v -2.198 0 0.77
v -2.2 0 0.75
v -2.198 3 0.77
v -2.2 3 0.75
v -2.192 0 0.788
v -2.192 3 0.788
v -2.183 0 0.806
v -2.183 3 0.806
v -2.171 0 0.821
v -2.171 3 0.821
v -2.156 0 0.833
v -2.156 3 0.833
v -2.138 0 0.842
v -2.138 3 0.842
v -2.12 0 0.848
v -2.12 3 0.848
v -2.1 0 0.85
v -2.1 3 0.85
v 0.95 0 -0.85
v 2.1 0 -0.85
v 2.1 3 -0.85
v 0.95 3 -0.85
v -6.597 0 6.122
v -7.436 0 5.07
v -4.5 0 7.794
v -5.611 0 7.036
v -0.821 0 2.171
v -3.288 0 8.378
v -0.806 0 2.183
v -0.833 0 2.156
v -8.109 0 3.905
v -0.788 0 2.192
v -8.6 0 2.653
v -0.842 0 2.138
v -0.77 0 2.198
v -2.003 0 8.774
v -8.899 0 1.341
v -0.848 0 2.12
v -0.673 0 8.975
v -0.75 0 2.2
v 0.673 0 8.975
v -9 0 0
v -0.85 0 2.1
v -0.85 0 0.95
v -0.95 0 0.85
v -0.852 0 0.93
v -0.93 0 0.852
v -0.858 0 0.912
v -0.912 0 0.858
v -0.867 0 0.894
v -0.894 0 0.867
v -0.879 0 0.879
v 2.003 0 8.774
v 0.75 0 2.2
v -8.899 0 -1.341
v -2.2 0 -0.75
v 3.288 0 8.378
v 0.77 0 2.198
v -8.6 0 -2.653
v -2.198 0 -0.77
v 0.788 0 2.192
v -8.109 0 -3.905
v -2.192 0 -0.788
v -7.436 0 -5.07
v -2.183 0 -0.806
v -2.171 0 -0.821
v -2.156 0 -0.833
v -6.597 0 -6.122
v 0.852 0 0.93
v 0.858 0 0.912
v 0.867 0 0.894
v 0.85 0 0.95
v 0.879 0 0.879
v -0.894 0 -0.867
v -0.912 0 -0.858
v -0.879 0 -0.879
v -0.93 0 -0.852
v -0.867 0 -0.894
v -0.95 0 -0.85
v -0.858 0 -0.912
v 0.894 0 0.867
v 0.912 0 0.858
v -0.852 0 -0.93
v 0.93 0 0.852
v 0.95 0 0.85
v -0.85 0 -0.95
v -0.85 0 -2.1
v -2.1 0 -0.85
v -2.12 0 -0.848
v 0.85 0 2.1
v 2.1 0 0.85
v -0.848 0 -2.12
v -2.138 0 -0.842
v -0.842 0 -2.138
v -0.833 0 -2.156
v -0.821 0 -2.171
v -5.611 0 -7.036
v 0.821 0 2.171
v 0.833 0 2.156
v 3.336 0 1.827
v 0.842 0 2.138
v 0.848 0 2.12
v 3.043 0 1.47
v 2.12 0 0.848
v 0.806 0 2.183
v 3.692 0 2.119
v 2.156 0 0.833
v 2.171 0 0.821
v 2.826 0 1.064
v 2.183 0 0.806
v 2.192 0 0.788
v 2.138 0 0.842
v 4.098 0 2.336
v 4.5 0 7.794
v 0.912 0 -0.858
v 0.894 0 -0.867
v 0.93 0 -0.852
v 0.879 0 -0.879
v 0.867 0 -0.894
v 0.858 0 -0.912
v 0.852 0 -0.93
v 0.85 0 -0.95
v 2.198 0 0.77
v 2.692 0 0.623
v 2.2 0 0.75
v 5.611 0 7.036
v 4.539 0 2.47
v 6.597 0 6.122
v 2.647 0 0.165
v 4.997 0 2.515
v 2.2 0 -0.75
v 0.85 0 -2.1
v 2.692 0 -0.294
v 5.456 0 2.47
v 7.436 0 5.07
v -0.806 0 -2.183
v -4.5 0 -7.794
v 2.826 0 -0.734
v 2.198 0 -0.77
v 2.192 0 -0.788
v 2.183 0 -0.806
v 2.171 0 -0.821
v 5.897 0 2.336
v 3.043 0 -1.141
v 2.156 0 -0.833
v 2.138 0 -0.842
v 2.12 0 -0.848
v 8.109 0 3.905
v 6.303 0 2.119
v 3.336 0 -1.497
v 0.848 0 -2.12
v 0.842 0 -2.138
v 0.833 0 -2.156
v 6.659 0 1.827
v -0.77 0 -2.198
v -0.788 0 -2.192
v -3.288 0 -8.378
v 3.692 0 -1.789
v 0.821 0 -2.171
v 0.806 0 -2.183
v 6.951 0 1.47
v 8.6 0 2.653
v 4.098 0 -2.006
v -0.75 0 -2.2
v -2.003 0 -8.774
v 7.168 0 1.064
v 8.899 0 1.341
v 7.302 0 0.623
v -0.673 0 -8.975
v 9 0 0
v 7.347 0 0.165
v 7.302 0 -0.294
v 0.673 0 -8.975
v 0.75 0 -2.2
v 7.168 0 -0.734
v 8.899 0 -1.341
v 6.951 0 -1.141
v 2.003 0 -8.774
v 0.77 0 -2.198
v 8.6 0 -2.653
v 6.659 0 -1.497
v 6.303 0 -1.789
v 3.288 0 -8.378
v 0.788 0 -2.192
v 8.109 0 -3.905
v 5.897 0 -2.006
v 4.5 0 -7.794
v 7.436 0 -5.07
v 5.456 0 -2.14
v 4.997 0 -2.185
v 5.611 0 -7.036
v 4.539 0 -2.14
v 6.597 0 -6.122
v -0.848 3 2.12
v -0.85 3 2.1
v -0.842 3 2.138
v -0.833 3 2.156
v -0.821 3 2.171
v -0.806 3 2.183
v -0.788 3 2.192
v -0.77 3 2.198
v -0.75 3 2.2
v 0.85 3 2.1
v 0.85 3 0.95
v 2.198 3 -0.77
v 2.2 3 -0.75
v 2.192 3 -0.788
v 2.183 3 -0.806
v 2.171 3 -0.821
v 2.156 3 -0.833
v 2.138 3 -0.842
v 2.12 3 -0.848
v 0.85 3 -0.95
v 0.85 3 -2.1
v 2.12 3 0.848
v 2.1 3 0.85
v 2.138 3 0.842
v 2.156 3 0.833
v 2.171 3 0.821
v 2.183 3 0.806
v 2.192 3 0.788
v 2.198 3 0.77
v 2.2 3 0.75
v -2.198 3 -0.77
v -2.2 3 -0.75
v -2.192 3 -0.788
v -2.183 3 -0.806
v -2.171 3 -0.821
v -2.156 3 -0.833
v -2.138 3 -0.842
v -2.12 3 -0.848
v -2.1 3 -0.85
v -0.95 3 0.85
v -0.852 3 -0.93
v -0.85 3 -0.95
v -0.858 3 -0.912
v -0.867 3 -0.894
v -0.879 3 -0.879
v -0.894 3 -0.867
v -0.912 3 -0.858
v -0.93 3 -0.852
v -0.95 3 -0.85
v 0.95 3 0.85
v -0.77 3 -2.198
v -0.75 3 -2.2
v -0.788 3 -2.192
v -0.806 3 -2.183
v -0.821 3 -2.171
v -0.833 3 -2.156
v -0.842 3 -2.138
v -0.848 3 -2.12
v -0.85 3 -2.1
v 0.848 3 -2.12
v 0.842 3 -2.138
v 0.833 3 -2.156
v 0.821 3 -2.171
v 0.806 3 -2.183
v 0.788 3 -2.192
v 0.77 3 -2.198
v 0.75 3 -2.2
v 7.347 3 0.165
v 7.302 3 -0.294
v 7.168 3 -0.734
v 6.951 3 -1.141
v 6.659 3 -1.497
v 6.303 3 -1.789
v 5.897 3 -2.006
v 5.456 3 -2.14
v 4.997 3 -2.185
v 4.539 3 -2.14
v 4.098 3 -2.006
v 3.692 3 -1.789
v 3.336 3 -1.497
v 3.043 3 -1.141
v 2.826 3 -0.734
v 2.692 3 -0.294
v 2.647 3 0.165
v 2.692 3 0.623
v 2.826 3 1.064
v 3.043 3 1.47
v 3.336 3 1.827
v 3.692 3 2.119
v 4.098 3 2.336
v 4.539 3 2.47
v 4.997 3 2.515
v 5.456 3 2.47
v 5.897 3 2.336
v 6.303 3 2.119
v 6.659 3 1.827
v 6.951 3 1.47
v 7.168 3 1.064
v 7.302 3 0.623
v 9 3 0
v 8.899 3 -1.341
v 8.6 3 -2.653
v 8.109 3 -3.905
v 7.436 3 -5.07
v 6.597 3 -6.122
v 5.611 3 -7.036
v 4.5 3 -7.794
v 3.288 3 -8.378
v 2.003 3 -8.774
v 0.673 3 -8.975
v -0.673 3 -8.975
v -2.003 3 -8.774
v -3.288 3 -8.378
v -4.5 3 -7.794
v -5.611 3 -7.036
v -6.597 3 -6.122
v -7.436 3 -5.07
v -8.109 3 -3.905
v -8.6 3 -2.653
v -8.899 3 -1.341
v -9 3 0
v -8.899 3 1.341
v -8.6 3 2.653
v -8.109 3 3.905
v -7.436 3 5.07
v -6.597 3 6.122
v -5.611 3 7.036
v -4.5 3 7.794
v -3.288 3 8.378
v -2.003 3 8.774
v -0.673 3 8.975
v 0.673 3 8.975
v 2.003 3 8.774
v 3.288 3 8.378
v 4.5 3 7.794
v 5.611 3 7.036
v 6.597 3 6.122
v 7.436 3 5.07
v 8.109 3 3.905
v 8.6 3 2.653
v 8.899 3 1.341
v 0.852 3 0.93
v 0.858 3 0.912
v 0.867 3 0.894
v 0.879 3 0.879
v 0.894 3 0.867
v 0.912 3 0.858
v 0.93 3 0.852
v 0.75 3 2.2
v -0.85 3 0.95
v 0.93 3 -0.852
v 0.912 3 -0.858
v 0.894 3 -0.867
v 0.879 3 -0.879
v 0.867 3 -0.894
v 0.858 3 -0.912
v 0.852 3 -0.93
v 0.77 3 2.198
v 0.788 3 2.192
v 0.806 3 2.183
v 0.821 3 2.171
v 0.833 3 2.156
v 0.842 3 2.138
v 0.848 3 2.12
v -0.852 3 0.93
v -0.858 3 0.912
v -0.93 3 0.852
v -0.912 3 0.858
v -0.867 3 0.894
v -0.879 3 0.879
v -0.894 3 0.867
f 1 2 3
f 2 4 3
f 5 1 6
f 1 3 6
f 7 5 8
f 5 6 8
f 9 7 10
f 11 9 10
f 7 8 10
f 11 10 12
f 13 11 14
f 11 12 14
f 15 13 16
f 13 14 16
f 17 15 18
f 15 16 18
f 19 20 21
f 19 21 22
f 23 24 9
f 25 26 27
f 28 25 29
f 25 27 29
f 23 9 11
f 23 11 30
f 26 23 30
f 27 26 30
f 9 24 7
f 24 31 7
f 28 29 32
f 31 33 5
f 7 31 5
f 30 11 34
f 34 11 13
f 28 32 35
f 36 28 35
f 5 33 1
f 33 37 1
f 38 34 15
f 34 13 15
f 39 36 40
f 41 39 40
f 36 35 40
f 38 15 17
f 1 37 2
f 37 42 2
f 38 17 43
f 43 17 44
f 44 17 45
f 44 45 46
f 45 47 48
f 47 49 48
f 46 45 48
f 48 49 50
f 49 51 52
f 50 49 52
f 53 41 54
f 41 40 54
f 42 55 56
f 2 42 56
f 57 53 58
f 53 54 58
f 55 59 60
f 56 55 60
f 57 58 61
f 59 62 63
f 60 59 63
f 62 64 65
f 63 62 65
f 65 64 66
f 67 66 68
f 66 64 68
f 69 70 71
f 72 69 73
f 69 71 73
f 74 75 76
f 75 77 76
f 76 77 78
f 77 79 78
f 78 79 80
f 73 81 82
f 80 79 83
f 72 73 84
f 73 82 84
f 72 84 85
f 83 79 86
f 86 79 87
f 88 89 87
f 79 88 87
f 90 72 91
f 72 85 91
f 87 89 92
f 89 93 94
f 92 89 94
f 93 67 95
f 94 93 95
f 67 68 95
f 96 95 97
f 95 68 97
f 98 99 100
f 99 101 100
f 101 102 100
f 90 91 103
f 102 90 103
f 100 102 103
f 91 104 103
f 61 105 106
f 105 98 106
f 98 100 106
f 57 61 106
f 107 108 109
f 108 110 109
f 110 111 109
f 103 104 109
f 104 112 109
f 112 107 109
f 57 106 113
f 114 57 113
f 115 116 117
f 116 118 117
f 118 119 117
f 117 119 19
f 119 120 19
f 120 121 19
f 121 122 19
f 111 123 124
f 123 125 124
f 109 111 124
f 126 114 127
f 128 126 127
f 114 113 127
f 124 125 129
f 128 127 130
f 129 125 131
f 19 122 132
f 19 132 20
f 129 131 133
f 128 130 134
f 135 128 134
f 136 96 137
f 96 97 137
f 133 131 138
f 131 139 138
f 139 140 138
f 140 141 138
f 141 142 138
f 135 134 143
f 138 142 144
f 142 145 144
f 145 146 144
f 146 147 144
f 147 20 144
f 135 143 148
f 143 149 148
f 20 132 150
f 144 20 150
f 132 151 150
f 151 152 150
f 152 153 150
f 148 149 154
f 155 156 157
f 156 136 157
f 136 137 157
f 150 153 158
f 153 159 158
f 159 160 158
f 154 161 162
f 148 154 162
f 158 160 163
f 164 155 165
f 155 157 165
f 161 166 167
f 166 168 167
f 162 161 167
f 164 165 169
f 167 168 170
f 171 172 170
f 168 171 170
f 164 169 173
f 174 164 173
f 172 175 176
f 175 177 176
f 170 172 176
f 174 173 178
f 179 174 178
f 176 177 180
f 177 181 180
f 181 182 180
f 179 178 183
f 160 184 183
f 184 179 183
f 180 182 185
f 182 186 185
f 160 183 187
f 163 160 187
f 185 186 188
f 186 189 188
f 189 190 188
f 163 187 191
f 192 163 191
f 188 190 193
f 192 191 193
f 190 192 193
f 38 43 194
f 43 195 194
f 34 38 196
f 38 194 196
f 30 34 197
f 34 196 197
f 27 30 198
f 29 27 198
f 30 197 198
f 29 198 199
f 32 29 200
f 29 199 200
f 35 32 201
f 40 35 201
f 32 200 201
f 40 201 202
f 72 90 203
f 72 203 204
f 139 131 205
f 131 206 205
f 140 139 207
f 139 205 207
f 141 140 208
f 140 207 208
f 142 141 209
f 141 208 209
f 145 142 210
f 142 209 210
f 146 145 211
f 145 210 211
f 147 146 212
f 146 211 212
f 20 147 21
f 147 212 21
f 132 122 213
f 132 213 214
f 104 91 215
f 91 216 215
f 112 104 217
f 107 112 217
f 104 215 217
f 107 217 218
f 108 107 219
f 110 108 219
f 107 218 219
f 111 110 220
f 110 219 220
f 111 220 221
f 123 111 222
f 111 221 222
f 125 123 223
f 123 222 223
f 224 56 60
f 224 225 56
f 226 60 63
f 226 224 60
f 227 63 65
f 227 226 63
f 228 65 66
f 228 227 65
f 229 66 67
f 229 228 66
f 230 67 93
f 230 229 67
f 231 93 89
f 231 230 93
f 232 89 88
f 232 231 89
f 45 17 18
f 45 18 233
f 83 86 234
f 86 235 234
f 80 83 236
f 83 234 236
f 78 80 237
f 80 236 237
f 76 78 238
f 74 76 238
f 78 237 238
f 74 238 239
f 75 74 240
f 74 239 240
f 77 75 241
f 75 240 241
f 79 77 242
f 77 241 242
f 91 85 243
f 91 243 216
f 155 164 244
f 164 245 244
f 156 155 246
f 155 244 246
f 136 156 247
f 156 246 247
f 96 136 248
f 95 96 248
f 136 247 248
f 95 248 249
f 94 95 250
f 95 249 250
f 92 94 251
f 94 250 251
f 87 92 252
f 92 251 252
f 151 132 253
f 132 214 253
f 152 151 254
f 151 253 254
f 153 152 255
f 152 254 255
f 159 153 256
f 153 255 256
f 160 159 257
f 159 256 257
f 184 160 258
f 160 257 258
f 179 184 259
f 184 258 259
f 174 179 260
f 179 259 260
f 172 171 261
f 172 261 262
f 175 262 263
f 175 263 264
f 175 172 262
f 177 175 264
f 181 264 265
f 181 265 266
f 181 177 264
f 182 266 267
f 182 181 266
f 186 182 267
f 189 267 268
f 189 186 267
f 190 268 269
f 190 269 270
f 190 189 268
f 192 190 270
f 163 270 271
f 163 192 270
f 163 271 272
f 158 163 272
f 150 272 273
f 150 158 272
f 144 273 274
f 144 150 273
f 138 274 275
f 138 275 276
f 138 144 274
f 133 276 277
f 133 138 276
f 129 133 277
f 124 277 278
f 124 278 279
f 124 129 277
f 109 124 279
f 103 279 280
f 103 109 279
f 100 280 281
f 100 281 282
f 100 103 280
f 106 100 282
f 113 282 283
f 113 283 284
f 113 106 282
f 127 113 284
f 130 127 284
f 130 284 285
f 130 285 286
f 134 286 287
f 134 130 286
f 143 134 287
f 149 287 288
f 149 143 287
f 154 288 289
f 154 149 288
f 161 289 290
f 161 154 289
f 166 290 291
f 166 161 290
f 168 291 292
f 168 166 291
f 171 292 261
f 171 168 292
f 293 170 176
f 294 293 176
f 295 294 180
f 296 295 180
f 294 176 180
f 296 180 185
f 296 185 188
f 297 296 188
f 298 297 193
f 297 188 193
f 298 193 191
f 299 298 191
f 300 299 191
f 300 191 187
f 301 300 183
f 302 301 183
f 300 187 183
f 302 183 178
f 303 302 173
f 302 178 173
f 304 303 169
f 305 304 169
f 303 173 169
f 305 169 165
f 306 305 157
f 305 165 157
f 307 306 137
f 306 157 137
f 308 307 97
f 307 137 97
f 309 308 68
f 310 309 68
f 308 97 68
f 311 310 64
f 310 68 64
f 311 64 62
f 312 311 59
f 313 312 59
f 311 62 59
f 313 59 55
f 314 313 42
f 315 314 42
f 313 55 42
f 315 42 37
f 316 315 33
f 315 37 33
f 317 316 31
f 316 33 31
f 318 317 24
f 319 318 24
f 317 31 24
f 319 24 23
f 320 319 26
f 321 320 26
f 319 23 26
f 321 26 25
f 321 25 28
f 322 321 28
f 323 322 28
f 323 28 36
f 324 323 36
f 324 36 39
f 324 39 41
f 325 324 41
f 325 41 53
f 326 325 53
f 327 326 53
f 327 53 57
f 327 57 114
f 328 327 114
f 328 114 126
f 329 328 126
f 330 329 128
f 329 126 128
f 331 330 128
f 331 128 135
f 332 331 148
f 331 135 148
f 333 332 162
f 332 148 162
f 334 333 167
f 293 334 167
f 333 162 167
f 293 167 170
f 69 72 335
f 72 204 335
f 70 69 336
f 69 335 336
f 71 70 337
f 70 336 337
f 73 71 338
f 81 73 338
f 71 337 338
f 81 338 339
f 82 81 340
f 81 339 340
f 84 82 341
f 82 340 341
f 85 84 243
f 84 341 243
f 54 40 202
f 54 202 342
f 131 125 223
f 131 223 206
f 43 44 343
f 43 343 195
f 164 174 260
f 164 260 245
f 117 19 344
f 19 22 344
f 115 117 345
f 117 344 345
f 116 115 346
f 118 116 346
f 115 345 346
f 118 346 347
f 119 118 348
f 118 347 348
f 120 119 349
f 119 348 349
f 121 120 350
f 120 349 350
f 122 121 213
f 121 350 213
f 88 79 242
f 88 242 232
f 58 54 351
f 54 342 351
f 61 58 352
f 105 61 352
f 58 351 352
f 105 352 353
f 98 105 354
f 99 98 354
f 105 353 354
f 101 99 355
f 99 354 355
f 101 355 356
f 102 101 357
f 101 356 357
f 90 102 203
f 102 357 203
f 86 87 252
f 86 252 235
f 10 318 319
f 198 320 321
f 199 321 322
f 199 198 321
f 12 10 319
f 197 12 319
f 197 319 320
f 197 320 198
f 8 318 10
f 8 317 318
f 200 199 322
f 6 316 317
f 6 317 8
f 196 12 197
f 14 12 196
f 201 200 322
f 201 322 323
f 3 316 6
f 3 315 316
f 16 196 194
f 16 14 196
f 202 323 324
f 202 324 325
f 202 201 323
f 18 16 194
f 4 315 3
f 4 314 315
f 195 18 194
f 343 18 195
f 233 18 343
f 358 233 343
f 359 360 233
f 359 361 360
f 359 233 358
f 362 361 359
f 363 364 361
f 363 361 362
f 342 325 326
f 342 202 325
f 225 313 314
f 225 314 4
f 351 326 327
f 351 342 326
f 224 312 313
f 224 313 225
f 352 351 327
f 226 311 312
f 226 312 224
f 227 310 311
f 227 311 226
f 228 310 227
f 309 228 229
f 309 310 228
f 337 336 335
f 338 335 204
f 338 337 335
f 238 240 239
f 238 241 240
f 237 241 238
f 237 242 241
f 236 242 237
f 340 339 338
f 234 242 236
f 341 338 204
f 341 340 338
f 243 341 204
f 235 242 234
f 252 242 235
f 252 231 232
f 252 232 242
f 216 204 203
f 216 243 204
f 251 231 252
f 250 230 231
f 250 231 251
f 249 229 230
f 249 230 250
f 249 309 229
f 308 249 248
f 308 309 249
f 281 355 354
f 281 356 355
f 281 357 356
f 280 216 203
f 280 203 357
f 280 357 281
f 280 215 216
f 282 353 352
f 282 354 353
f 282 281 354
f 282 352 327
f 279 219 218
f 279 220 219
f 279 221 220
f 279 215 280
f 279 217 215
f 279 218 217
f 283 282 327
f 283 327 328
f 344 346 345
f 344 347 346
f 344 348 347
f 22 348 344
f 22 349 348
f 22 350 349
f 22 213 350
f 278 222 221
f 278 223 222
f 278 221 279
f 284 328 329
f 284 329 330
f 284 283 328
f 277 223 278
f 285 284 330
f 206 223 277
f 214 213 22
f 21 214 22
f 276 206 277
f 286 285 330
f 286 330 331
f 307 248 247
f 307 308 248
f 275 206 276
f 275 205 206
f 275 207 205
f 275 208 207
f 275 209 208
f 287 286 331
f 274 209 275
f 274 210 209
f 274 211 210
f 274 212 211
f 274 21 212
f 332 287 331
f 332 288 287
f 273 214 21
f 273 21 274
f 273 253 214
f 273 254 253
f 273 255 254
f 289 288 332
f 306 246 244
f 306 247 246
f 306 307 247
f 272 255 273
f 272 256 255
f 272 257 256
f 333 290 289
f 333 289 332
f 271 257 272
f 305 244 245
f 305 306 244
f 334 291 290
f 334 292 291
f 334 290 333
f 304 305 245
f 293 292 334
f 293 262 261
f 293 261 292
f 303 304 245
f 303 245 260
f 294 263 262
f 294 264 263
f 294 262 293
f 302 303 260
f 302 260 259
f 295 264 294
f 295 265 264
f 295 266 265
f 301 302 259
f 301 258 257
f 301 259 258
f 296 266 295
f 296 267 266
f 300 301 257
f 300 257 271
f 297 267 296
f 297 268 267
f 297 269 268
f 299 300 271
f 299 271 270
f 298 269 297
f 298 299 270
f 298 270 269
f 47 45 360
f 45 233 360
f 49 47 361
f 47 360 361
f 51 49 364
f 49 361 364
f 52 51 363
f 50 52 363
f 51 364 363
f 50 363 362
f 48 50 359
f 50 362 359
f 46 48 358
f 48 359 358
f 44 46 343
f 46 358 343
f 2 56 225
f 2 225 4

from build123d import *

# Parameters (mm, degrees)
SKETCH1_R           = 9
SKETCH1_R_2         = 2.35
BOSS_EXTRUDE1_DEPTH = 3
FILLET1_R           = 0.1


with BuildPart() as part:
    # Sketch1 → Boss-Extrude1 (new body)
    with BuildSketch(Plane(origin=(0, 0, 0), x_dir=(1, 0, 0), z_dir=(0, 1, 0))):
        Circle(SKETCH1_R)
        with Locations((4.997281989, -0.164841493)):
            Circle(SKETCH1_R_2, mode=Mode.SUBTRACT)
        Polygon((-2.2, 0.85), (-2.2, -0.85), (-0.85, -0.85), (-0.85, -2.2), (0.85, -2.2), (0.85, -0.85), (2.2, -0.85), (2.2, 0.85), (0.85, 0.85), (0.85, 2.2), (-0.85, 2.2), (-0.85, 0.85), align=None, mode=Mode.SUBTRACT)
    extrude(amount=BOSS_EXTRUDE1_DEPTH)

    # Fillet1
    fillet1_edges = [part.edges().sort_by_distance(p)[0] for p in [
        (-0.85, 1.5, -0.85),
        (-2.2, 1.5, -0.85),
        (-2.2, 1.5, 0.85),
        (-0.85, 1.5, 0.85),
        (-0.85, 1.5, 2.2),
        (0.85, 1.5, 2.2),
        (0.85, 1.5, 0.85),
        (2.2, 1.5, 0.85),
        (2.2, 1.5, -0.85),
        (0.85, 1.5, -0.85),
        (0.85, 1.5, -2.2),
        (-0.85, 1.5, -2.2),
    ]]
    fillet(fillet1_edges, radius=FILLET1_R)


solid = part.part
